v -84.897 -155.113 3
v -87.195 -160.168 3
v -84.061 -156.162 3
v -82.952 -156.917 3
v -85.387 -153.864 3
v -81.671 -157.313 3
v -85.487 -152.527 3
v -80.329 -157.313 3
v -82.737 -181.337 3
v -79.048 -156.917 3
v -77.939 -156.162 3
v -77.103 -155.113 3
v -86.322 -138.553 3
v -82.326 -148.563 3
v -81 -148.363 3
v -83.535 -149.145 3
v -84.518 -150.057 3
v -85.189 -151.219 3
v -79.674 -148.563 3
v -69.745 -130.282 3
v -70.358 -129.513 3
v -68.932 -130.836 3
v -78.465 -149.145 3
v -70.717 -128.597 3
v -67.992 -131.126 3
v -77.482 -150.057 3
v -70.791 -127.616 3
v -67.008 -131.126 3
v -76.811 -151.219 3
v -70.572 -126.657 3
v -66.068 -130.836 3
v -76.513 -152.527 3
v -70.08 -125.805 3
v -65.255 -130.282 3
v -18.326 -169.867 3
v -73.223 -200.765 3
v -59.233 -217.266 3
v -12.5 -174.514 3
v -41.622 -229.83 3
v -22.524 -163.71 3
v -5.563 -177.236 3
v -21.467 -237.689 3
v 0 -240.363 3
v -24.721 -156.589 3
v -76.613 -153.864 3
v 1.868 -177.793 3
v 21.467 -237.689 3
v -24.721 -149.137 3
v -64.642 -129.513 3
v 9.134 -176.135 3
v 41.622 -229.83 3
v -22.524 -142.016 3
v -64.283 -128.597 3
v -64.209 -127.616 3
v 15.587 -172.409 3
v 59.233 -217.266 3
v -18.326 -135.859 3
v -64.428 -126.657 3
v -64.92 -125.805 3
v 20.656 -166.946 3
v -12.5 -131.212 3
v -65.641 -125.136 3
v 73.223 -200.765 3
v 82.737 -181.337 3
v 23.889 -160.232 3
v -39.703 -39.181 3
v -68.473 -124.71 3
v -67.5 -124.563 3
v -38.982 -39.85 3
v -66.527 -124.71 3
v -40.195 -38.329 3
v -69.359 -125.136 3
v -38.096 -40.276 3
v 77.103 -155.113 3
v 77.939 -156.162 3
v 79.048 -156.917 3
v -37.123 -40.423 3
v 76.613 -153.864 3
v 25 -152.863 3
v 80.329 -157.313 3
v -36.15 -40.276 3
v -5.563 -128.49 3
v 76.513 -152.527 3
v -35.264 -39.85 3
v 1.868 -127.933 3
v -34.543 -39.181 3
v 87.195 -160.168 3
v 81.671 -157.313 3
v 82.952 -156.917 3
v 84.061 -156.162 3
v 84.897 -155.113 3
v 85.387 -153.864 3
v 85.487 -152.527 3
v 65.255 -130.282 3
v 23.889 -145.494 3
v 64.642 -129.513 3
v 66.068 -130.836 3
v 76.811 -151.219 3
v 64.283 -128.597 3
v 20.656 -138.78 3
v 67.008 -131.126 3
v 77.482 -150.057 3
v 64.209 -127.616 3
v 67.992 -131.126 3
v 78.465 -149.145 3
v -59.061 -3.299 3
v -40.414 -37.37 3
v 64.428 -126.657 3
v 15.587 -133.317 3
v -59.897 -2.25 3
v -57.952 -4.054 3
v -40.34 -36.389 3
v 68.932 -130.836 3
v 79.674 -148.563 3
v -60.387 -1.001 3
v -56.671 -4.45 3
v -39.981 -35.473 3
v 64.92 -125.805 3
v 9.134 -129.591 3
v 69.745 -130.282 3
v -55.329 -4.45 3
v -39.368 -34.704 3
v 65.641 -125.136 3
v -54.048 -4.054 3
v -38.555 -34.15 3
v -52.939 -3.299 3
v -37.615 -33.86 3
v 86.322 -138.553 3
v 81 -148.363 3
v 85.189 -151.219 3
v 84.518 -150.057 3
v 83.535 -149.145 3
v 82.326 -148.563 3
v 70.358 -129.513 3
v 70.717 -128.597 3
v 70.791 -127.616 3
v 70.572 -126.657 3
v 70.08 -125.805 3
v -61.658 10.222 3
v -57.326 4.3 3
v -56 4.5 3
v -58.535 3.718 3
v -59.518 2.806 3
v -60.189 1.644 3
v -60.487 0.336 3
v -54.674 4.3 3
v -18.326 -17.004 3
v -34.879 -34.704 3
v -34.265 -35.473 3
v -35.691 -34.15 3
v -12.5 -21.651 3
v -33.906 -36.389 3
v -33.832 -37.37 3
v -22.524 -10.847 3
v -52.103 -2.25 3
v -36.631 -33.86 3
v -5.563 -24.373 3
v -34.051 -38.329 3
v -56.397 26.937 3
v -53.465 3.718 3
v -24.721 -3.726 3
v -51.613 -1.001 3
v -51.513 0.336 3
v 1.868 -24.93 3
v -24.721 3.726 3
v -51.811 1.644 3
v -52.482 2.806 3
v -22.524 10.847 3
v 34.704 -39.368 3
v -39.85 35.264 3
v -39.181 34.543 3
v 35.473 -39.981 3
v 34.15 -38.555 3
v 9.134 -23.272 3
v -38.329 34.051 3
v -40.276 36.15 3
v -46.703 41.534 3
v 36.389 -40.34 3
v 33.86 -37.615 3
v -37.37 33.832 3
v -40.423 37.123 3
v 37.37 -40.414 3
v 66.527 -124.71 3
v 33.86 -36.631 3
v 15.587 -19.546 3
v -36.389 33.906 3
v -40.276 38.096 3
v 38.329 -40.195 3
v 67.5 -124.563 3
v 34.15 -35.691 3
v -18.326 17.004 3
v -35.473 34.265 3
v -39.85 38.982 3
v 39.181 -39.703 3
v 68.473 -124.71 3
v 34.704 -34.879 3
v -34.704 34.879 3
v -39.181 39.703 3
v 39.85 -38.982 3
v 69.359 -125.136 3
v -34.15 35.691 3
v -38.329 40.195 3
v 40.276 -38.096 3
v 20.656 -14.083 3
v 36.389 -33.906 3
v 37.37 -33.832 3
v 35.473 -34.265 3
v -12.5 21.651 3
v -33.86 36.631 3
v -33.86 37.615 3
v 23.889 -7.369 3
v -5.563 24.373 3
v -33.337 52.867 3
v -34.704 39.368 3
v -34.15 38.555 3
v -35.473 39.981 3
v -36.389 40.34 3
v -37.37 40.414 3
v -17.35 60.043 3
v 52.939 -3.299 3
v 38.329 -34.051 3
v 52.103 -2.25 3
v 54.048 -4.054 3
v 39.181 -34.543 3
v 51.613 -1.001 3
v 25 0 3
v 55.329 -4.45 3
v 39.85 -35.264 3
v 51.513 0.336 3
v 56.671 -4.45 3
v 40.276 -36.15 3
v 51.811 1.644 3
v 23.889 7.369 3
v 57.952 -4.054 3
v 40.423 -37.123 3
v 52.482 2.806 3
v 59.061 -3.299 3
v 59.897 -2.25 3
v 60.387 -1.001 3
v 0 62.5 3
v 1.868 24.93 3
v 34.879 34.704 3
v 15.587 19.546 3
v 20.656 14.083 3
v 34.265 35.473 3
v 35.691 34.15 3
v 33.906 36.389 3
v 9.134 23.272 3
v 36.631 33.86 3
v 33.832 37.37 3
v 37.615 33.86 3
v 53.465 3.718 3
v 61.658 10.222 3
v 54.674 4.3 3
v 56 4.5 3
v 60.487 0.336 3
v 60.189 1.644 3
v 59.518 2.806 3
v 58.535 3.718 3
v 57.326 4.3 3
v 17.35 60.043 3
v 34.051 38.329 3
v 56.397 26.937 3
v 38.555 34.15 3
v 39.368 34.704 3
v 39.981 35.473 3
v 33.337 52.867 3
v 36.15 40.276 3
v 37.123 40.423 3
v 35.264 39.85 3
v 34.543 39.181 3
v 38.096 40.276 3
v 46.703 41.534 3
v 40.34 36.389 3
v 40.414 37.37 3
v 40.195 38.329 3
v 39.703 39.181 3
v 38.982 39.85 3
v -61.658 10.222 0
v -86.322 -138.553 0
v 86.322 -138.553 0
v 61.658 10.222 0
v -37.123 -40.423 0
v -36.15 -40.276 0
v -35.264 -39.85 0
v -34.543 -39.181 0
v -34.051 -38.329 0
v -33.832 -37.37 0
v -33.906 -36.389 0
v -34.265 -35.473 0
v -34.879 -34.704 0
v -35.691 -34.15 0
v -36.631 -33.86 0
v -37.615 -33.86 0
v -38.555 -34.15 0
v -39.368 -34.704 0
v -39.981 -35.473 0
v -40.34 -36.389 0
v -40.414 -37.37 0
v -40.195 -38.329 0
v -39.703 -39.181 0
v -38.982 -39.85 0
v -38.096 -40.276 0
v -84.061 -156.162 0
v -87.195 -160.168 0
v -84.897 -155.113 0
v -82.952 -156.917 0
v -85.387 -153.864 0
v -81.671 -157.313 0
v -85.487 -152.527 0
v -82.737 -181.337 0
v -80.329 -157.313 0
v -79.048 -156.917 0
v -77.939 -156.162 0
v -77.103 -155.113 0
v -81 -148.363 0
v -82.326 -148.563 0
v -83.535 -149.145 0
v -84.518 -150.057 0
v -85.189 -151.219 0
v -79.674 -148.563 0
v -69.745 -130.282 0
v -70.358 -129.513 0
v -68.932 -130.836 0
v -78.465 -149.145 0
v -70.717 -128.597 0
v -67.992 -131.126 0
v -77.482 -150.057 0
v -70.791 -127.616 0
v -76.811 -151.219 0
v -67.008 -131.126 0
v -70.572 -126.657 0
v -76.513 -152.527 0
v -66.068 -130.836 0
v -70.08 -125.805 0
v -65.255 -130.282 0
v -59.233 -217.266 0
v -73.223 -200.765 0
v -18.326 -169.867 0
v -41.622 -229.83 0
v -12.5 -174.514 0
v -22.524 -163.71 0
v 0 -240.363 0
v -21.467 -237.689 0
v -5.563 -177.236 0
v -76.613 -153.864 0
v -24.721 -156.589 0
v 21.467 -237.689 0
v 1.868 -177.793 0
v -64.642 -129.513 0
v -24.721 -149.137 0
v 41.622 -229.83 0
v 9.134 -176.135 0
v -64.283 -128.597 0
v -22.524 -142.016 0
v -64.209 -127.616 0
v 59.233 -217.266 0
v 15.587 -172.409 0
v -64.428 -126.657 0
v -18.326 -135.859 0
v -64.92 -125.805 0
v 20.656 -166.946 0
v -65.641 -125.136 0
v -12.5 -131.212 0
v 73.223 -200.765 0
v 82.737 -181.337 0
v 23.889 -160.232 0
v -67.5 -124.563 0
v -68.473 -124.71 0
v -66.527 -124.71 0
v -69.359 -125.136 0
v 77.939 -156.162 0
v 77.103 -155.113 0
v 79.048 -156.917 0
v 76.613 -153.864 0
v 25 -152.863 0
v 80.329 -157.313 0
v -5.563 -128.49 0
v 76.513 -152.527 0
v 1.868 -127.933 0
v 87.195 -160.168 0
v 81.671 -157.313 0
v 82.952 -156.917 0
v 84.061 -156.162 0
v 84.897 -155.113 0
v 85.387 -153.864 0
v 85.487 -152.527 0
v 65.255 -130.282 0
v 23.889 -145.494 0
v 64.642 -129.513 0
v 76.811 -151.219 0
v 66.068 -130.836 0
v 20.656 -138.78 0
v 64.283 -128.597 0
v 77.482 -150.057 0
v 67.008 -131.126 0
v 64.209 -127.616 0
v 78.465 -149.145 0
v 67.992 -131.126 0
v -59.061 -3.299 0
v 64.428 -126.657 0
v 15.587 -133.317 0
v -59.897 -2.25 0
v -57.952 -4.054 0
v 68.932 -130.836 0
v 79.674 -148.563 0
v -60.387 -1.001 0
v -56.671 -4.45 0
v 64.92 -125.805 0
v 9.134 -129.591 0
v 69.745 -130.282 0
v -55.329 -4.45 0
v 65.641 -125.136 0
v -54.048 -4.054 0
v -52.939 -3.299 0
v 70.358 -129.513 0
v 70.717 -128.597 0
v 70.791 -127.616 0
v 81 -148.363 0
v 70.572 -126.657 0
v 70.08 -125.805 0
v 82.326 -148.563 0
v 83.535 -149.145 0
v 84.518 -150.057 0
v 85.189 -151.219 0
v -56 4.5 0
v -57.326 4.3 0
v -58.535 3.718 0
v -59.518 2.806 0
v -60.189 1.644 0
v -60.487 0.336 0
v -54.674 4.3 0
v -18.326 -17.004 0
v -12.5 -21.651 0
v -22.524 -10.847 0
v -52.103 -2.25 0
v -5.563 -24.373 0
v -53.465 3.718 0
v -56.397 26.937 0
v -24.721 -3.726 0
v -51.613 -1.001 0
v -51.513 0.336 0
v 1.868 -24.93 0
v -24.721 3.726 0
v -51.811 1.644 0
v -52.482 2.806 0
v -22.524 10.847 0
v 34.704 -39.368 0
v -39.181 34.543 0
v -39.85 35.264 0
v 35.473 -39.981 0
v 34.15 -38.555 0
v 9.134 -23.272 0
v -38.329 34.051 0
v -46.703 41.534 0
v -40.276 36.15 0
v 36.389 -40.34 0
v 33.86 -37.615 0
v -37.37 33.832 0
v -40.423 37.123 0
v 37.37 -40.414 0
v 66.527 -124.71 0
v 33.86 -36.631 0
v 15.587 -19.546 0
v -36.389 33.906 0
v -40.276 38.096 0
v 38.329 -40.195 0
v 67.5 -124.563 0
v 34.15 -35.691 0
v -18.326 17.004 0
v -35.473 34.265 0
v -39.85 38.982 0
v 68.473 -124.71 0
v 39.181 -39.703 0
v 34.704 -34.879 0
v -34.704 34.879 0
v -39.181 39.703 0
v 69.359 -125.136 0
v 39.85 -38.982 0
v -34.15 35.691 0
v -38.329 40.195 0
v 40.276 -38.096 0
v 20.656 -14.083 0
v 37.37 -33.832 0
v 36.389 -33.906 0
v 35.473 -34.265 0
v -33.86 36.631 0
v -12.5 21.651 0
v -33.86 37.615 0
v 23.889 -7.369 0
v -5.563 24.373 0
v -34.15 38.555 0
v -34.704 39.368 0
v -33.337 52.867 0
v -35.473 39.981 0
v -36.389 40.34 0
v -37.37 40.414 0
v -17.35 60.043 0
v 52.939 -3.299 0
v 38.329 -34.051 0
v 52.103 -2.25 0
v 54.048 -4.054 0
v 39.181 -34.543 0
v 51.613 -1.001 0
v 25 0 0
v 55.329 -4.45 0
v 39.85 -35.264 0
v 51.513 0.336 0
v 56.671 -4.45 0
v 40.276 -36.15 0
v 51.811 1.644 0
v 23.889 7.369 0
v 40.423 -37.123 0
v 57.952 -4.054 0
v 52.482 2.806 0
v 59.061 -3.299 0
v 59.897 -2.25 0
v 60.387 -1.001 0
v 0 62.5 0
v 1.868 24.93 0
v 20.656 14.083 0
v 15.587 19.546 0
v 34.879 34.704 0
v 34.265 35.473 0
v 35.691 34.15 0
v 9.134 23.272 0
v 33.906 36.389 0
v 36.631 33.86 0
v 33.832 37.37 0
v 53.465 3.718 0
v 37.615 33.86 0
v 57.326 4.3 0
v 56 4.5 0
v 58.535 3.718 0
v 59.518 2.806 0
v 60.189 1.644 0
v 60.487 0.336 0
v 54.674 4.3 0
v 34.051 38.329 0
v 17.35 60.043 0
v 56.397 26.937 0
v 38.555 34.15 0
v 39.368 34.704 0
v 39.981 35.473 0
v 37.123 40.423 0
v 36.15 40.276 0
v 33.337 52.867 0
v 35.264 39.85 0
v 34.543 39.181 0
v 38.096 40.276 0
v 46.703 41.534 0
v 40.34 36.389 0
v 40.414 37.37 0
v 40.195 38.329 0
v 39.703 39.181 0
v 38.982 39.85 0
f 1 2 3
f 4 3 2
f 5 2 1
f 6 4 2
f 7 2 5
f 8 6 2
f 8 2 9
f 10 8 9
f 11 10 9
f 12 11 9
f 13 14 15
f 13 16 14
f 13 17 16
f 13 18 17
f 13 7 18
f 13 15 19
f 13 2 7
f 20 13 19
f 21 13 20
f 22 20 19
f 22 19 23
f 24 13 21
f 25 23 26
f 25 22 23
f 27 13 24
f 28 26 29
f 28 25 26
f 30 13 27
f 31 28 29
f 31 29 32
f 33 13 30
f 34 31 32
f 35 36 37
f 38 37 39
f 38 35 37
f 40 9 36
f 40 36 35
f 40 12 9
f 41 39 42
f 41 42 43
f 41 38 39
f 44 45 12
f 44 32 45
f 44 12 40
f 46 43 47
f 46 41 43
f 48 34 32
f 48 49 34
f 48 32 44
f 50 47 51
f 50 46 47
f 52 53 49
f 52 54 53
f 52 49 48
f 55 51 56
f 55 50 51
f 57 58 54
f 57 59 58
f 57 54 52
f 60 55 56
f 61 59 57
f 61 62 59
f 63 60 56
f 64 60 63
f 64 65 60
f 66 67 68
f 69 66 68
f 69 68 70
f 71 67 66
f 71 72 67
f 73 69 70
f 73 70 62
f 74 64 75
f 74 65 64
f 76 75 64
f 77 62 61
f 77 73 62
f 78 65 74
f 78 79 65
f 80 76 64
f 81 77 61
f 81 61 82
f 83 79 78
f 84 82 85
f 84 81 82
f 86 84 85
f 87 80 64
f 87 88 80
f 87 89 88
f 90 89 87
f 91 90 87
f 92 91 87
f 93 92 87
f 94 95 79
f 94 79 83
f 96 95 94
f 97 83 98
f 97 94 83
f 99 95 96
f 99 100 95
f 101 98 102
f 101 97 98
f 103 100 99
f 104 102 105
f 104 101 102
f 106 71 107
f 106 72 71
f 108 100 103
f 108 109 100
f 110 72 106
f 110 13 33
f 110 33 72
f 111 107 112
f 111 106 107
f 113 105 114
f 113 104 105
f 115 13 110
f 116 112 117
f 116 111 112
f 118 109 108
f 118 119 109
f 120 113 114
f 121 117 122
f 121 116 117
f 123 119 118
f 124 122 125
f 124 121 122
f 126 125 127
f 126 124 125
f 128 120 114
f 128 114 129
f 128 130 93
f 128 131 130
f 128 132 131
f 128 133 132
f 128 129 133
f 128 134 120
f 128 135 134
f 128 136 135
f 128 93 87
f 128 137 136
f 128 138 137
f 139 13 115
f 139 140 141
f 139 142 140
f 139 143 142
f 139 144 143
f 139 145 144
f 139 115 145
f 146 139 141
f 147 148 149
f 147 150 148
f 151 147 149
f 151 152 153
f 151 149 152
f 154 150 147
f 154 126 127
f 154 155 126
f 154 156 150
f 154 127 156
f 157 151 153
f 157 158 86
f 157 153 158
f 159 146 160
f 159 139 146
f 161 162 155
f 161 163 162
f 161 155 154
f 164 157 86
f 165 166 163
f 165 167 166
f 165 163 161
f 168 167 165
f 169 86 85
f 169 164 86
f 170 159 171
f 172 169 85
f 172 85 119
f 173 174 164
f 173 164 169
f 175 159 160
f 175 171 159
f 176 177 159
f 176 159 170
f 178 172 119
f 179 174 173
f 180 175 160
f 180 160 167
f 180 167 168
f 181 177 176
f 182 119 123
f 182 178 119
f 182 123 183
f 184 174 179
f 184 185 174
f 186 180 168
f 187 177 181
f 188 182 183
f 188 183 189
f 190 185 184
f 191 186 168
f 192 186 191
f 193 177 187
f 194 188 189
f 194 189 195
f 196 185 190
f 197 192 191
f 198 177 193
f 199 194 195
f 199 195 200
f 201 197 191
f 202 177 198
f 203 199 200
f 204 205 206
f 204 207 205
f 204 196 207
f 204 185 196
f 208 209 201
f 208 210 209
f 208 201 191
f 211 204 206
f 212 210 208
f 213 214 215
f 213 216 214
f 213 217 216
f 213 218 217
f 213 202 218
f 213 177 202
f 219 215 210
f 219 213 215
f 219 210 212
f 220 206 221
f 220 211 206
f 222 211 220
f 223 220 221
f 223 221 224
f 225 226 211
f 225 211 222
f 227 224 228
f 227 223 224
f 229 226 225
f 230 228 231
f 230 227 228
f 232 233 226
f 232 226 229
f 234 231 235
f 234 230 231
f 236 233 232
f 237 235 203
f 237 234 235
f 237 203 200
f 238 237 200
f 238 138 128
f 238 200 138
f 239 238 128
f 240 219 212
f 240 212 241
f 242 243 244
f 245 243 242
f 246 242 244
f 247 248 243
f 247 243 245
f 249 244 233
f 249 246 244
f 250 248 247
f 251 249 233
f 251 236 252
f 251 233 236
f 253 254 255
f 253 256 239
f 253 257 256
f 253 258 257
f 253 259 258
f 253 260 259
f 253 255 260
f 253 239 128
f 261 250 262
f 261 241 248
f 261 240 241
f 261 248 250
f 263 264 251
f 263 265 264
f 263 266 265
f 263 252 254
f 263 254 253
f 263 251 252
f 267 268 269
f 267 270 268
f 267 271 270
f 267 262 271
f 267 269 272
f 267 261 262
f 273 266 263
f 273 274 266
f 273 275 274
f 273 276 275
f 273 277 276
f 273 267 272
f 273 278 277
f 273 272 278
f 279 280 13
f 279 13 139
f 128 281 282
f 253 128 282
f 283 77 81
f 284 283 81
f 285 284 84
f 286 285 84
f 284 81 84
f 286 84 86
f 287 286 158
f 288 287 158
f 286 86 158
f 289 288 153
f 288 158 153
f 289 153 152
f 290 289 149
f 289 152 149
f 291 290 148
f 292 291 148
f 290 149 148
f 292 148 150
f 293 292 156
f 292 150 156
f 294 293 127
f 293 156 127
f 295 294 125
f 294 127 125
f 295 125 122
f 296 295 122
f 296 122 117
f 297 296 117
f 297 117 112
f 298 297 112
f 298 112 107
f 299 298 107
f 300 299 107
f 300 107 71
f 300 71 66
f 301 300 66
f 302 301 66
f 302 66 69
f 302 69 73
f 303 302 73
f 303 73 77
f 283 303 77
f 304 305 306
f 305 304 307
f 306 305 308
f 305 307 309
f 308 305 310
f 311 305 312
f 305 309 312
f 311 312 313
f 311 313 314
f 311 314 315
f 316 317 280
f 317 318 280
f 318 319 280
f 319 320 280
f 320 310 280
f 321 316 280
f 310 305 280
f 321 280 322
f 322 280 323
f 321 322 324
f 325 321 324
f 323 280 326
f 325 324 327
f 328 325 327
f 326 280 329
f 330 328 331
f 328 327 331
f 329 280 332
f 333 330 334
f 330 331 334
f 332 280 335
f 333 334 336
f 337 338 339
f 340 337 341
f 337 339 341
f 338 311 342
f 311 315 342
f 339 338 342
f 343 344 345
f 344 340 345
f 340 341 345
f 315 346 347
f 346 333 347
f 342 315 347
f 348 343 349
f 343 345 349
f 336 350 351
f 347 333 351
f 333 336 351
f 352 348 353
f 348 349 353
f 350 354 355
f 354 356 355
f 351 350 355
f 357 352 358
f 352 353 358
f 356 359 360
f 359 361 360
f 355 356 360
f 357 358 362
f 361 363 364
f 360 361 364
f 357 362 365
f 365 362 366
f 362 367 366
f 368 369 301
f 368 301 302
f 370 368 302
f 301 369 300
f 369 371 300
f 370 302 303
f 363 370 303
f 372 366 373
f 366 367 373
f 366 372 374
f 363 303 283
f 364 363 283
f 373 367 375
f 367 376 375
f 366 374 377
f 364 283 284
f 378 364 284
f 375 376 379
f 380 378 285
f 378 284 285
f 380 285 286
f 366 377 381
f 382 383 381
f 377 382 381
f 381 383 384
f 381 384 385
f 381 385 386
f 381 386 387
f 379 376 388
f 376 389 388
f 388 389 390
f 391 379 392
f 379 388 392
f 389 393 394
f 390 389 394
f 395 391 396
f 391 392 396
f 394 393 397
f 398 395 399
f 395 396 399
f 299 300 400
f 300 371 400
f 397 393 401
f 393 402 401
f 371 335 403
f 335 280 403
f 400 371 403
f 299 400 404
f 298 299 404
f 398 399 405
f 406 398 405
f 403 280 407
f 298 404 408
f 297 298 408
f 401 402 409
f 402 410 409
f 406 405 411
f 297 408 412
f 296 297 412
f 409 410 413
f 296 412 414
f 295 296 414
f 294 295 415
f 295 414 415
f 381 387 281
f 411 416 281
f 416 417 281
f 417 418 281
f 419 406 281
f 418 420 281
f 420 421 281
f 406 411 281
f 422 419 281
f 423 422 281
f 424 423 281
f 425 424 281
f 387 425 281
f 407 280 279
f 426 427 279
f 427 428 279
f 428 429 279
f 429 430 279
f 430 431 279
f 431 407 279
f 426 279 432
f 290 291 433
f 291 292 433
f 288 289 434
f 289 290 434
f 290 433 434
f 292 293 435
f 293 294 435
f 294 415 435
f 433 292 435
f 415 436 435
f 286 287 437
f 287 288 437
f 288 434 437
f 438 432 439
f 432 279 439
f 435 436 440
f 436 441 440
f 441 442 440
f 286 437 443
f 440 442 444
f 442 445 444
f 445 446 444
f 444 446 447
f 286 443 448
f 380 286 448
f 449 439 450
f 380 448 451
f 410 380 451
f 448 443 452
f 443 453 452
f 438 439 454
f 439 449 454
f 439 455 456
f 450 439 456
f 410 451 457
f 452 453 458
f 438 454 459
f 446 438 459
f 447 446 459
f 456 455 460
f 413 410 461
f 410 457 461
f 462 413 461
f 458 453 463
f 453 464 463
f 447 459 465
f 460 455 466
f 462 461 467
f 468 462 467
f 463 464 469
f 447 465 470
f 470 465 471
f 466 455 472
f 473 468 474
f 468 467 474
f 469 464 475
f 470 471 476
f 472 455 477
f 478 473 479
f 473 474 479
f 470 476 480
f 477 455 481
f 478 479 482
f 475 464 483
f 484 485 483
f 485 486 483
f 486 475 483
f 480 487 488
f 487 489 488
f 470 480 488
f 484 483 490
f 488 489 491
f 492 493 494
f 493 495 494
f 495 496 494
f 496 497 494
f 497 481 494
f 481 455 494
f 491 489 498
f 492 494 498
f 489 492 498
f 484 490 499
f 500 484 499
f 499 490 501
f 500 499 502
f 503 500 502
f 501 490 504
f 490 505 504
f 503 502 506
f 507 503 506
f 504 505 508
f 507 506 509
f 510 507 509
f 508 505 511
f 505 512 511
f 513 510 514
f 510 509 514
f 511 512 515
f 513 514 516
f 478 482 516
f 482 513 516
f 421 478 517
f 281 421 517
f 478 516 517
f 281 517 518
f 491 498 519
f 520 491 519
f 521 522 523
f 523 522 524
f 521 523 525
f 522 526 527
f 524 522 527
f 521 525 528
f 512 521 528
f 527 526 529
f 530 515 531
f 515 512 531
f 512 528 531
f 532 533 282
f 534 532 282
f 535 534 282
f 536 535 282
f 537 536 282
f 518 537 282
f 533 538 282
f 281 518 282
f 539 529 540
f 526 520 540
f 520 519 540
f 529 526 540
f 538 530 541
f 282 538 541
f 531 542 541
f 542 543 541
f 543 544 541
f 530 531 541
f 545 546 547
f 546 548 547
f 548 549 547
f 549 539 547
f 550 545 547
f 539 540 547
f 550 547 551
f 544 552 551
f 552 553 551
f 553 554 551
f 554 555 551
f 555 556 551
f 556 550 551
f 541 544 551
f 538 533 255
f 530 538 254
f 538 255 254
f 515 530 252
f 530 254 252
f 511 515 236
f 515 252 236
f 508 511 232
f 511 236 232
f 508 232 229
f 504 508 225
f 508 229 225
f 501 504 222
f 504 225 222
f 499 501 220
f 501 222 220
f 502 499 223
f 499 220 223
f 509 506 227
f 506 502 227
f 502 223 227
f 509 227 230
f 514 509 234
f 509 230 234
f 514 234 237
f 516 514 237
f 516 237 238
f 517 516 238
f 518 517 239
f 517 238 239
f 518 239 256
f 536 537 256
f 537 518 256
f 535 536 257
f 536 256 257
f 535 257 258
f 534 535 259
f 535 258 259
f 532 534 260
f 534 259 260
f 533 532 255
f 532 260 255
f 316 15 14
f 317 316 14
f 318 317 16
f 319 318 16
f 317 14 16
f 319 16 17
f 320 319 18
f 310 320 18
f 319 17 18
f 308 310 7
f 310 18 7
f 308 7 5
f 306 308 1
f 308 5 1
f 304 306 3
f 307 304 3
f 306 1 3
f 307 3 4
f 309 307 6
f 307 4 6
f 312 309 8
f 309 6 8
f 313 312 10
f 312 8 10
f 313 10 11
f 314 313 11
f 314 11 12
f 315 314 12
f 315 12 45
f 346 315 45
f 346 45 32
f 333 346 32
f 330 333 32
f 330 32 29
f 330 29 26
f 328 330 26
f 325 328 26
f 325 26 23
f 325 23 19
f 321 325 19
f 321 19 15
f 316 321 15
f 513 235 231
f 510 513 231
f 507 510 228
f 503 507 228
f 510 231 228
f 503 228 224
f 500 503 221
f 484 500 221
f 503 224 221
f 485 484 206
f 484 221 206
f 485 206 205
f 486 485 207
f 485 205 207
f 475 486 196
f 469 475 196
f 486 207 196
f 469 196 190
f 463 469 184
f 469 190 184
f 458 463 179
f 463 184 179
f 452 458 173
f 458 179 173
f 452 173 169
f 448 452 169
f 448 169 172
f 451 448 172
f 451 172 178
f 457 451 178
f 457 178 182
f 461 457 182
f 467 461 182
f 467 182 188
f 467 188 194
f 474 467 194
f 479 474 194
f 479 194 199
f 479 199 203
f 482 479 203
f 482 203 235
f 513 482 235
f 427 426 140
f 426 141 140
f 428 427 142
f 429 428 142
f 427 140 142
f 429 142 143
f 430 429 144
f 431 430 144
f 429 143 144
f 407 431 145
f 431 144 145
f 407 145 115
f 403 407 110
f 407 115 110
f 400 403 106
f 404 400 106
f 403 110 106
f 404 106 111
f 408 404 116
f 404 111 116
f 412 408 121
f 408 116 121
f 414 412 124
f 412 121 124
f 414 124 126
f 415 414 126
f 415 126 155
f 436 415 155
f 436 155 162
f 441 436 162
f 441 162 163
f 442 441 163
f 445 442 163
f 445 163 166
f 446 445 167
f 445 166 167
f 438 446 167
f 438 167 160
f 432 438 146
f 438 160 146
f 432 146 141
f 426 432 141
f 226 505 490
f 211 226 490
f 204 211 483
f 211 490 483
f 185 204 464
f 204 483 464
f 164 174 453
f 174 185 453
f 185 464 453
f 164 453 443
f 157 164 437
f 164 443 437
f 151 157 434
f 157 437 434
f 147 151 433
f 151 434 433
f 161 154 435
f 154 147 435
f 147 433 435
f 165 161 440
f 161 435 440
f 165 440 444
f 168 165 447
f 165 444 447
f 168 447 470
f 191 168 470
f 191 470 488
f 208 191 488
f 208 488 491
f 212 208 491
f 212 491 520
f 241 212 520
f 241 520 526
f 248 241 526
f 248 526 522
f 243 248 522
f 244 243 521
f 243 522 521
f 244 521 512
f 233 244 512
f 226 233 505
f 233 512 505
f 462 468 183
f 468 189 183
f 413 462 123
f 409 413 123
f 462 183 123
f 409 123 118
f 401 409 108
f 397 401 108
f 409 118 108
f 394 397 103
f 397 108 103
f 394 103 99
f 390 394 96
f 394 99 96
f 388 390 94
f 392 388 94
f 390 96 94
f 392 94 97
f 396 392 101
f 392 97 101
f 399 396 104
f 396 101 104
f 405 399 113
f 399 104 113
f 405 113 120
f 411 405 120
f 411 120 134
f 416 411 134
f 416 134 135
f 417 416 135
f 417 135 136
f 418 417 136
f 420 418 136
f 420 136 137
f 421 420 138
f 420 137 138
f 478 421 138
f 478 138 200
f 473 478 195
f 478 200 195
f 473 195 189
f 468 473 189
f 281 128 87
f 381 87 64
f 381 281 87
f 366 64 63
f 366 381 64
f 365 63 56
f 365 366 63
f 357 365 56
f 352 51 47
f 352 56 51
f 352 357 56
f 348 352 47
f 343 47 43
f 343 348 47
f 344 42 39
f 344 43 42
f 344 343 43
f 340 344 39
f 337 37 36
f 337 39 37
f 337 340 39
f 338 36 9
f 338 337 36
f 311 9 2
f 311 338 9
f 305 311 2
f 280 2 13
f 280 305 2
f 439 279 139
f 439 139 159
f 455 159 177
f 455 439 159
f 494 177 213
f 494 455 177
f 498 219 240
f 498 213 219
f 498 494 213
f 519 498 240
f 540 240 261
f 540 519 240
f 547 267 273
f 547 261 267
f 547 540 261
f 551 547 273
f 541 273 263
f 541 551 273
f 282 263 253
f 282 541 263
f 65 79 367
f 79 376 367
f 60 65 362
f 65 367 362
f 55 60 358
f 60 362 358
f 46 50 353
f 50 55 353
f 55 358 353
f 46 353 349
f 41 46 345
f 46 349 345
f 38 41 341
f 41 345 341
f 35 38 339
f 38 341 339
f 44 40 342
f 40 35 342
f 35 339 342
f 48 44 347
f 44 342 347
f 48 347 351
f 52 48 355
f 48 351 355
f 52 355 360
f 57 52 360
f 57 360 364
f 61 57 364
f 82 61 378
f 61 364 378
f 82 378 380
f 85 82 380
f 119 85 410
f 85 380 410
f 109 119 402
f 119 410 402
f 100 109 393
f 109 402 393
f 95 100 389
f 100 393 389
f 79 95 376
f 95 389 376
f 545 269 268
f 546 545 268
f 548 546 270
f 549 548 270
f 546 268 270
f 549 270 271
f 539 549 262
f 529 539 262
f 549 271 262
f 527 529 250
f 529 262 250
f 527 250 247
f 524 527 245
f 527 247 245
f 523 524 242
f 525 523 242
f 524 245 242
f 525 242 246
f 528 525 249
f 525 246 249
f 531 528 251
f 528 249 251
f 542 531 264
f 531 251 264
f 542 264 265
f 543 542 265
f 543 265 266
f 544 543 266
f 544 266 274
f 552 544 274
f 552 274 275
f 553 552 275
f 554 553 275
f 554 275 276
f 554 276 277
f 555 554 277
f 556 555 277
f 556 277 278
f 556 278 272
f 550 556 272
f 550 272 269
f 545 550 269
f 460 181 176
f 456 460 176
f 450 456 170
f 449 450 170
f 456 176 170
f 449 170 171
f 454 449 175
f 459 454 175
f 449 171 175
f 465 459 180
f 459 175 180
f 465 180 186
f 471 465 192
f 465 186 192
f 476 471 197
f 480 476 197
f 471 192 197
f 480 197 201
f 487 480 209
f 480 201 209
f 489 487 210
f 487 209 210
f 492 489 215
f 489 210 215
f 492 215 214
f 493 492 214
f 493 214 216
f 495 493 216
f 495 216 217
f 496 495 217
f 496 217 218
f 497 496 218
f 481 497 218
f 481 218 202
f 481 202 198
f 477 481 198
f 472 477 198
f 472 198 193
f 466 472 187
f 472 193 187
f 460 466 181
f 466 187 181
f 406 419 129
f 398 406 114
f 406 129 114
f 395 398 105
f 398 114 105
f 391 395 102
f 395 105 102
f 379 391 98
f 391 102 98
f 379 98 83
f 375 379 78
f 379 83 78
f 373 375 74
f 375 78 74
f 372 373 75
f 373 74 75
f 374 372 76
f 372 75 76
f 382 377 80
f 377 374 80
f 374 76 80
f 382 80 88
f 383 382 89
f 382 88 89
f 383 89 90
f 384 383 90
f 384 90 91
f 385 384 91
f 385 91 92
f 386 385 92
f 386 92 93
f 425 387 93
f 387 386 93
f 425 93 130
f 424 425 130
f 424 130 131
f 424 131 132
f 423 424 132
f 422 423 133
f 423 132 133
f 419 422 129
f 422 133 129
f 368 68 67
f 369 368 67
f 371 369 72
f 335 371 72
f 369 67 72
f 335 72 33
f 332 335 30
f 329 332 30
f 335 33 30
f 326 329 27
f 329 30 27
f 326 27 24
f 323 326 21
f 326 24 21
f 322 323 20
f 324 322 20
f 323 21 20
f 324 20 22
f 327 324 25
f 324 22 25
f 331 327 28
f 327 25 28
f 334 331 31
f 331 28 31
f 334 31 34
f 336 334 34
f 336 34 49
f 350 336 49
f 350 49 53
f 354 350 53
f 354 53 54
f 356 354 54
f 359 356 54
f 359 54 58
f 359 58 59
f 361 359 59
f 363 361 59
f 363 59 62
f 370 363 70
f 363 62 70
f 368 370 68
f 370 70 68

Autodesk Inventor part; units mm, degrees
ref_plane "YZ Plane" through (0, 0, 0) normal (1, 0, 0) x (0, 1, 0)
ref_plane "XZ Plane" through (0, 0, 0) normal (0, 1, 0) x (-1, 0, 0)
ref_plane "XY Plane" through (0, 0, 0) normal (0, 0, 1) x (1, 0, 0)
sketch "Sketch1" plane through (0, 0, 0) normal (0, 0, 1) x (1, 0, 0)
  circle A0 centre (0, 0) radius 52.5 construction
  circle A1 centre (0, 0) radius 25
  circle A2 centre (0, 0) radius 62.5
  line L0 (0, 0) -> (0, 52.5) construction
  line L1 (0, 0) -> (37.1231, 37.1231) construction
  line L2 (0, 0) -> (0, -152.863) construction
  circle A3 centre (0, -152.863) radius 87.5
  line L3 (-86.3219, -138.5528) -> (-61.6585, 10.2216)
  line L4 (86.3219, -138.5528) -> (61.6585, 10.2216)
  circle A4 centre (0, -152.863) radius 25
  circle A5 centre (0, -152.863) radius 81 construction
  circle A6 centre (0, 0) radius 56 construction
  line L5 (0, 0) -> (-56, 0) construction
  line L6 (0, -152.863) -> (-81, -152.863) construction
  dimension "d31" = 162
  dimension "d32" = 112
  dimension "d0" = 105
  dimension "d1" = 50
  dimension "d2" = 125
  dimension "d3" = 45
  dimension "d4" = 152.863
  dimension "d5" = 175
  dimension "d6" = 50
extrude "Extrusion1" add sketch "Sketch1" along normal blind 3
sketch "Sketch2" plane through (0, 0, 0) normal (0, 0, 1) x (1, 0, 0)
  line L0 (0, 0) -> (0, -127.863)
  line L1 (67.5, -127.863) -> (-67.5, -127.863)
  arc A0 (-86.3219, -138.5528) -> (86.3219, -138.5528) centre (0, -152.863) ccw projected
  dimension "d11" = 127.863
  dimension "d12" = 135
  dimension "d40" = 25
hole "Hole1" at (67.5, -127.863, 0) at (-67.5, -127.863, 0) direction (0, 0, 1) diameter 6.6 end through all clearance for "Hex Head Cap Screw ISO 24017" size "M6" standard "ISO"
hole "Hole2" at (37.1231, 37.1231, 0) direction (0, 0, 1) diameter 6.6 end through all clearance for "Hex Head Cap Screw ISO 24017" size "M6" standard "ISO"
pattern_circular "Circular Pattern1" count 4 over 360 about axis through (0, 0, 0) along (0, 0, 1) of "Hole2"
hole "Hole3" at (-56, 0, 0) at (-81, -152.863, 0) direction (0, 0, 1) diameter 9 end through all
mirror "Mirror1" about plane through (0, 0, 0) normal (1, 0, 0) of "Hole3"
properties part number "PWTR-0084" material "Aluminum 6061"
